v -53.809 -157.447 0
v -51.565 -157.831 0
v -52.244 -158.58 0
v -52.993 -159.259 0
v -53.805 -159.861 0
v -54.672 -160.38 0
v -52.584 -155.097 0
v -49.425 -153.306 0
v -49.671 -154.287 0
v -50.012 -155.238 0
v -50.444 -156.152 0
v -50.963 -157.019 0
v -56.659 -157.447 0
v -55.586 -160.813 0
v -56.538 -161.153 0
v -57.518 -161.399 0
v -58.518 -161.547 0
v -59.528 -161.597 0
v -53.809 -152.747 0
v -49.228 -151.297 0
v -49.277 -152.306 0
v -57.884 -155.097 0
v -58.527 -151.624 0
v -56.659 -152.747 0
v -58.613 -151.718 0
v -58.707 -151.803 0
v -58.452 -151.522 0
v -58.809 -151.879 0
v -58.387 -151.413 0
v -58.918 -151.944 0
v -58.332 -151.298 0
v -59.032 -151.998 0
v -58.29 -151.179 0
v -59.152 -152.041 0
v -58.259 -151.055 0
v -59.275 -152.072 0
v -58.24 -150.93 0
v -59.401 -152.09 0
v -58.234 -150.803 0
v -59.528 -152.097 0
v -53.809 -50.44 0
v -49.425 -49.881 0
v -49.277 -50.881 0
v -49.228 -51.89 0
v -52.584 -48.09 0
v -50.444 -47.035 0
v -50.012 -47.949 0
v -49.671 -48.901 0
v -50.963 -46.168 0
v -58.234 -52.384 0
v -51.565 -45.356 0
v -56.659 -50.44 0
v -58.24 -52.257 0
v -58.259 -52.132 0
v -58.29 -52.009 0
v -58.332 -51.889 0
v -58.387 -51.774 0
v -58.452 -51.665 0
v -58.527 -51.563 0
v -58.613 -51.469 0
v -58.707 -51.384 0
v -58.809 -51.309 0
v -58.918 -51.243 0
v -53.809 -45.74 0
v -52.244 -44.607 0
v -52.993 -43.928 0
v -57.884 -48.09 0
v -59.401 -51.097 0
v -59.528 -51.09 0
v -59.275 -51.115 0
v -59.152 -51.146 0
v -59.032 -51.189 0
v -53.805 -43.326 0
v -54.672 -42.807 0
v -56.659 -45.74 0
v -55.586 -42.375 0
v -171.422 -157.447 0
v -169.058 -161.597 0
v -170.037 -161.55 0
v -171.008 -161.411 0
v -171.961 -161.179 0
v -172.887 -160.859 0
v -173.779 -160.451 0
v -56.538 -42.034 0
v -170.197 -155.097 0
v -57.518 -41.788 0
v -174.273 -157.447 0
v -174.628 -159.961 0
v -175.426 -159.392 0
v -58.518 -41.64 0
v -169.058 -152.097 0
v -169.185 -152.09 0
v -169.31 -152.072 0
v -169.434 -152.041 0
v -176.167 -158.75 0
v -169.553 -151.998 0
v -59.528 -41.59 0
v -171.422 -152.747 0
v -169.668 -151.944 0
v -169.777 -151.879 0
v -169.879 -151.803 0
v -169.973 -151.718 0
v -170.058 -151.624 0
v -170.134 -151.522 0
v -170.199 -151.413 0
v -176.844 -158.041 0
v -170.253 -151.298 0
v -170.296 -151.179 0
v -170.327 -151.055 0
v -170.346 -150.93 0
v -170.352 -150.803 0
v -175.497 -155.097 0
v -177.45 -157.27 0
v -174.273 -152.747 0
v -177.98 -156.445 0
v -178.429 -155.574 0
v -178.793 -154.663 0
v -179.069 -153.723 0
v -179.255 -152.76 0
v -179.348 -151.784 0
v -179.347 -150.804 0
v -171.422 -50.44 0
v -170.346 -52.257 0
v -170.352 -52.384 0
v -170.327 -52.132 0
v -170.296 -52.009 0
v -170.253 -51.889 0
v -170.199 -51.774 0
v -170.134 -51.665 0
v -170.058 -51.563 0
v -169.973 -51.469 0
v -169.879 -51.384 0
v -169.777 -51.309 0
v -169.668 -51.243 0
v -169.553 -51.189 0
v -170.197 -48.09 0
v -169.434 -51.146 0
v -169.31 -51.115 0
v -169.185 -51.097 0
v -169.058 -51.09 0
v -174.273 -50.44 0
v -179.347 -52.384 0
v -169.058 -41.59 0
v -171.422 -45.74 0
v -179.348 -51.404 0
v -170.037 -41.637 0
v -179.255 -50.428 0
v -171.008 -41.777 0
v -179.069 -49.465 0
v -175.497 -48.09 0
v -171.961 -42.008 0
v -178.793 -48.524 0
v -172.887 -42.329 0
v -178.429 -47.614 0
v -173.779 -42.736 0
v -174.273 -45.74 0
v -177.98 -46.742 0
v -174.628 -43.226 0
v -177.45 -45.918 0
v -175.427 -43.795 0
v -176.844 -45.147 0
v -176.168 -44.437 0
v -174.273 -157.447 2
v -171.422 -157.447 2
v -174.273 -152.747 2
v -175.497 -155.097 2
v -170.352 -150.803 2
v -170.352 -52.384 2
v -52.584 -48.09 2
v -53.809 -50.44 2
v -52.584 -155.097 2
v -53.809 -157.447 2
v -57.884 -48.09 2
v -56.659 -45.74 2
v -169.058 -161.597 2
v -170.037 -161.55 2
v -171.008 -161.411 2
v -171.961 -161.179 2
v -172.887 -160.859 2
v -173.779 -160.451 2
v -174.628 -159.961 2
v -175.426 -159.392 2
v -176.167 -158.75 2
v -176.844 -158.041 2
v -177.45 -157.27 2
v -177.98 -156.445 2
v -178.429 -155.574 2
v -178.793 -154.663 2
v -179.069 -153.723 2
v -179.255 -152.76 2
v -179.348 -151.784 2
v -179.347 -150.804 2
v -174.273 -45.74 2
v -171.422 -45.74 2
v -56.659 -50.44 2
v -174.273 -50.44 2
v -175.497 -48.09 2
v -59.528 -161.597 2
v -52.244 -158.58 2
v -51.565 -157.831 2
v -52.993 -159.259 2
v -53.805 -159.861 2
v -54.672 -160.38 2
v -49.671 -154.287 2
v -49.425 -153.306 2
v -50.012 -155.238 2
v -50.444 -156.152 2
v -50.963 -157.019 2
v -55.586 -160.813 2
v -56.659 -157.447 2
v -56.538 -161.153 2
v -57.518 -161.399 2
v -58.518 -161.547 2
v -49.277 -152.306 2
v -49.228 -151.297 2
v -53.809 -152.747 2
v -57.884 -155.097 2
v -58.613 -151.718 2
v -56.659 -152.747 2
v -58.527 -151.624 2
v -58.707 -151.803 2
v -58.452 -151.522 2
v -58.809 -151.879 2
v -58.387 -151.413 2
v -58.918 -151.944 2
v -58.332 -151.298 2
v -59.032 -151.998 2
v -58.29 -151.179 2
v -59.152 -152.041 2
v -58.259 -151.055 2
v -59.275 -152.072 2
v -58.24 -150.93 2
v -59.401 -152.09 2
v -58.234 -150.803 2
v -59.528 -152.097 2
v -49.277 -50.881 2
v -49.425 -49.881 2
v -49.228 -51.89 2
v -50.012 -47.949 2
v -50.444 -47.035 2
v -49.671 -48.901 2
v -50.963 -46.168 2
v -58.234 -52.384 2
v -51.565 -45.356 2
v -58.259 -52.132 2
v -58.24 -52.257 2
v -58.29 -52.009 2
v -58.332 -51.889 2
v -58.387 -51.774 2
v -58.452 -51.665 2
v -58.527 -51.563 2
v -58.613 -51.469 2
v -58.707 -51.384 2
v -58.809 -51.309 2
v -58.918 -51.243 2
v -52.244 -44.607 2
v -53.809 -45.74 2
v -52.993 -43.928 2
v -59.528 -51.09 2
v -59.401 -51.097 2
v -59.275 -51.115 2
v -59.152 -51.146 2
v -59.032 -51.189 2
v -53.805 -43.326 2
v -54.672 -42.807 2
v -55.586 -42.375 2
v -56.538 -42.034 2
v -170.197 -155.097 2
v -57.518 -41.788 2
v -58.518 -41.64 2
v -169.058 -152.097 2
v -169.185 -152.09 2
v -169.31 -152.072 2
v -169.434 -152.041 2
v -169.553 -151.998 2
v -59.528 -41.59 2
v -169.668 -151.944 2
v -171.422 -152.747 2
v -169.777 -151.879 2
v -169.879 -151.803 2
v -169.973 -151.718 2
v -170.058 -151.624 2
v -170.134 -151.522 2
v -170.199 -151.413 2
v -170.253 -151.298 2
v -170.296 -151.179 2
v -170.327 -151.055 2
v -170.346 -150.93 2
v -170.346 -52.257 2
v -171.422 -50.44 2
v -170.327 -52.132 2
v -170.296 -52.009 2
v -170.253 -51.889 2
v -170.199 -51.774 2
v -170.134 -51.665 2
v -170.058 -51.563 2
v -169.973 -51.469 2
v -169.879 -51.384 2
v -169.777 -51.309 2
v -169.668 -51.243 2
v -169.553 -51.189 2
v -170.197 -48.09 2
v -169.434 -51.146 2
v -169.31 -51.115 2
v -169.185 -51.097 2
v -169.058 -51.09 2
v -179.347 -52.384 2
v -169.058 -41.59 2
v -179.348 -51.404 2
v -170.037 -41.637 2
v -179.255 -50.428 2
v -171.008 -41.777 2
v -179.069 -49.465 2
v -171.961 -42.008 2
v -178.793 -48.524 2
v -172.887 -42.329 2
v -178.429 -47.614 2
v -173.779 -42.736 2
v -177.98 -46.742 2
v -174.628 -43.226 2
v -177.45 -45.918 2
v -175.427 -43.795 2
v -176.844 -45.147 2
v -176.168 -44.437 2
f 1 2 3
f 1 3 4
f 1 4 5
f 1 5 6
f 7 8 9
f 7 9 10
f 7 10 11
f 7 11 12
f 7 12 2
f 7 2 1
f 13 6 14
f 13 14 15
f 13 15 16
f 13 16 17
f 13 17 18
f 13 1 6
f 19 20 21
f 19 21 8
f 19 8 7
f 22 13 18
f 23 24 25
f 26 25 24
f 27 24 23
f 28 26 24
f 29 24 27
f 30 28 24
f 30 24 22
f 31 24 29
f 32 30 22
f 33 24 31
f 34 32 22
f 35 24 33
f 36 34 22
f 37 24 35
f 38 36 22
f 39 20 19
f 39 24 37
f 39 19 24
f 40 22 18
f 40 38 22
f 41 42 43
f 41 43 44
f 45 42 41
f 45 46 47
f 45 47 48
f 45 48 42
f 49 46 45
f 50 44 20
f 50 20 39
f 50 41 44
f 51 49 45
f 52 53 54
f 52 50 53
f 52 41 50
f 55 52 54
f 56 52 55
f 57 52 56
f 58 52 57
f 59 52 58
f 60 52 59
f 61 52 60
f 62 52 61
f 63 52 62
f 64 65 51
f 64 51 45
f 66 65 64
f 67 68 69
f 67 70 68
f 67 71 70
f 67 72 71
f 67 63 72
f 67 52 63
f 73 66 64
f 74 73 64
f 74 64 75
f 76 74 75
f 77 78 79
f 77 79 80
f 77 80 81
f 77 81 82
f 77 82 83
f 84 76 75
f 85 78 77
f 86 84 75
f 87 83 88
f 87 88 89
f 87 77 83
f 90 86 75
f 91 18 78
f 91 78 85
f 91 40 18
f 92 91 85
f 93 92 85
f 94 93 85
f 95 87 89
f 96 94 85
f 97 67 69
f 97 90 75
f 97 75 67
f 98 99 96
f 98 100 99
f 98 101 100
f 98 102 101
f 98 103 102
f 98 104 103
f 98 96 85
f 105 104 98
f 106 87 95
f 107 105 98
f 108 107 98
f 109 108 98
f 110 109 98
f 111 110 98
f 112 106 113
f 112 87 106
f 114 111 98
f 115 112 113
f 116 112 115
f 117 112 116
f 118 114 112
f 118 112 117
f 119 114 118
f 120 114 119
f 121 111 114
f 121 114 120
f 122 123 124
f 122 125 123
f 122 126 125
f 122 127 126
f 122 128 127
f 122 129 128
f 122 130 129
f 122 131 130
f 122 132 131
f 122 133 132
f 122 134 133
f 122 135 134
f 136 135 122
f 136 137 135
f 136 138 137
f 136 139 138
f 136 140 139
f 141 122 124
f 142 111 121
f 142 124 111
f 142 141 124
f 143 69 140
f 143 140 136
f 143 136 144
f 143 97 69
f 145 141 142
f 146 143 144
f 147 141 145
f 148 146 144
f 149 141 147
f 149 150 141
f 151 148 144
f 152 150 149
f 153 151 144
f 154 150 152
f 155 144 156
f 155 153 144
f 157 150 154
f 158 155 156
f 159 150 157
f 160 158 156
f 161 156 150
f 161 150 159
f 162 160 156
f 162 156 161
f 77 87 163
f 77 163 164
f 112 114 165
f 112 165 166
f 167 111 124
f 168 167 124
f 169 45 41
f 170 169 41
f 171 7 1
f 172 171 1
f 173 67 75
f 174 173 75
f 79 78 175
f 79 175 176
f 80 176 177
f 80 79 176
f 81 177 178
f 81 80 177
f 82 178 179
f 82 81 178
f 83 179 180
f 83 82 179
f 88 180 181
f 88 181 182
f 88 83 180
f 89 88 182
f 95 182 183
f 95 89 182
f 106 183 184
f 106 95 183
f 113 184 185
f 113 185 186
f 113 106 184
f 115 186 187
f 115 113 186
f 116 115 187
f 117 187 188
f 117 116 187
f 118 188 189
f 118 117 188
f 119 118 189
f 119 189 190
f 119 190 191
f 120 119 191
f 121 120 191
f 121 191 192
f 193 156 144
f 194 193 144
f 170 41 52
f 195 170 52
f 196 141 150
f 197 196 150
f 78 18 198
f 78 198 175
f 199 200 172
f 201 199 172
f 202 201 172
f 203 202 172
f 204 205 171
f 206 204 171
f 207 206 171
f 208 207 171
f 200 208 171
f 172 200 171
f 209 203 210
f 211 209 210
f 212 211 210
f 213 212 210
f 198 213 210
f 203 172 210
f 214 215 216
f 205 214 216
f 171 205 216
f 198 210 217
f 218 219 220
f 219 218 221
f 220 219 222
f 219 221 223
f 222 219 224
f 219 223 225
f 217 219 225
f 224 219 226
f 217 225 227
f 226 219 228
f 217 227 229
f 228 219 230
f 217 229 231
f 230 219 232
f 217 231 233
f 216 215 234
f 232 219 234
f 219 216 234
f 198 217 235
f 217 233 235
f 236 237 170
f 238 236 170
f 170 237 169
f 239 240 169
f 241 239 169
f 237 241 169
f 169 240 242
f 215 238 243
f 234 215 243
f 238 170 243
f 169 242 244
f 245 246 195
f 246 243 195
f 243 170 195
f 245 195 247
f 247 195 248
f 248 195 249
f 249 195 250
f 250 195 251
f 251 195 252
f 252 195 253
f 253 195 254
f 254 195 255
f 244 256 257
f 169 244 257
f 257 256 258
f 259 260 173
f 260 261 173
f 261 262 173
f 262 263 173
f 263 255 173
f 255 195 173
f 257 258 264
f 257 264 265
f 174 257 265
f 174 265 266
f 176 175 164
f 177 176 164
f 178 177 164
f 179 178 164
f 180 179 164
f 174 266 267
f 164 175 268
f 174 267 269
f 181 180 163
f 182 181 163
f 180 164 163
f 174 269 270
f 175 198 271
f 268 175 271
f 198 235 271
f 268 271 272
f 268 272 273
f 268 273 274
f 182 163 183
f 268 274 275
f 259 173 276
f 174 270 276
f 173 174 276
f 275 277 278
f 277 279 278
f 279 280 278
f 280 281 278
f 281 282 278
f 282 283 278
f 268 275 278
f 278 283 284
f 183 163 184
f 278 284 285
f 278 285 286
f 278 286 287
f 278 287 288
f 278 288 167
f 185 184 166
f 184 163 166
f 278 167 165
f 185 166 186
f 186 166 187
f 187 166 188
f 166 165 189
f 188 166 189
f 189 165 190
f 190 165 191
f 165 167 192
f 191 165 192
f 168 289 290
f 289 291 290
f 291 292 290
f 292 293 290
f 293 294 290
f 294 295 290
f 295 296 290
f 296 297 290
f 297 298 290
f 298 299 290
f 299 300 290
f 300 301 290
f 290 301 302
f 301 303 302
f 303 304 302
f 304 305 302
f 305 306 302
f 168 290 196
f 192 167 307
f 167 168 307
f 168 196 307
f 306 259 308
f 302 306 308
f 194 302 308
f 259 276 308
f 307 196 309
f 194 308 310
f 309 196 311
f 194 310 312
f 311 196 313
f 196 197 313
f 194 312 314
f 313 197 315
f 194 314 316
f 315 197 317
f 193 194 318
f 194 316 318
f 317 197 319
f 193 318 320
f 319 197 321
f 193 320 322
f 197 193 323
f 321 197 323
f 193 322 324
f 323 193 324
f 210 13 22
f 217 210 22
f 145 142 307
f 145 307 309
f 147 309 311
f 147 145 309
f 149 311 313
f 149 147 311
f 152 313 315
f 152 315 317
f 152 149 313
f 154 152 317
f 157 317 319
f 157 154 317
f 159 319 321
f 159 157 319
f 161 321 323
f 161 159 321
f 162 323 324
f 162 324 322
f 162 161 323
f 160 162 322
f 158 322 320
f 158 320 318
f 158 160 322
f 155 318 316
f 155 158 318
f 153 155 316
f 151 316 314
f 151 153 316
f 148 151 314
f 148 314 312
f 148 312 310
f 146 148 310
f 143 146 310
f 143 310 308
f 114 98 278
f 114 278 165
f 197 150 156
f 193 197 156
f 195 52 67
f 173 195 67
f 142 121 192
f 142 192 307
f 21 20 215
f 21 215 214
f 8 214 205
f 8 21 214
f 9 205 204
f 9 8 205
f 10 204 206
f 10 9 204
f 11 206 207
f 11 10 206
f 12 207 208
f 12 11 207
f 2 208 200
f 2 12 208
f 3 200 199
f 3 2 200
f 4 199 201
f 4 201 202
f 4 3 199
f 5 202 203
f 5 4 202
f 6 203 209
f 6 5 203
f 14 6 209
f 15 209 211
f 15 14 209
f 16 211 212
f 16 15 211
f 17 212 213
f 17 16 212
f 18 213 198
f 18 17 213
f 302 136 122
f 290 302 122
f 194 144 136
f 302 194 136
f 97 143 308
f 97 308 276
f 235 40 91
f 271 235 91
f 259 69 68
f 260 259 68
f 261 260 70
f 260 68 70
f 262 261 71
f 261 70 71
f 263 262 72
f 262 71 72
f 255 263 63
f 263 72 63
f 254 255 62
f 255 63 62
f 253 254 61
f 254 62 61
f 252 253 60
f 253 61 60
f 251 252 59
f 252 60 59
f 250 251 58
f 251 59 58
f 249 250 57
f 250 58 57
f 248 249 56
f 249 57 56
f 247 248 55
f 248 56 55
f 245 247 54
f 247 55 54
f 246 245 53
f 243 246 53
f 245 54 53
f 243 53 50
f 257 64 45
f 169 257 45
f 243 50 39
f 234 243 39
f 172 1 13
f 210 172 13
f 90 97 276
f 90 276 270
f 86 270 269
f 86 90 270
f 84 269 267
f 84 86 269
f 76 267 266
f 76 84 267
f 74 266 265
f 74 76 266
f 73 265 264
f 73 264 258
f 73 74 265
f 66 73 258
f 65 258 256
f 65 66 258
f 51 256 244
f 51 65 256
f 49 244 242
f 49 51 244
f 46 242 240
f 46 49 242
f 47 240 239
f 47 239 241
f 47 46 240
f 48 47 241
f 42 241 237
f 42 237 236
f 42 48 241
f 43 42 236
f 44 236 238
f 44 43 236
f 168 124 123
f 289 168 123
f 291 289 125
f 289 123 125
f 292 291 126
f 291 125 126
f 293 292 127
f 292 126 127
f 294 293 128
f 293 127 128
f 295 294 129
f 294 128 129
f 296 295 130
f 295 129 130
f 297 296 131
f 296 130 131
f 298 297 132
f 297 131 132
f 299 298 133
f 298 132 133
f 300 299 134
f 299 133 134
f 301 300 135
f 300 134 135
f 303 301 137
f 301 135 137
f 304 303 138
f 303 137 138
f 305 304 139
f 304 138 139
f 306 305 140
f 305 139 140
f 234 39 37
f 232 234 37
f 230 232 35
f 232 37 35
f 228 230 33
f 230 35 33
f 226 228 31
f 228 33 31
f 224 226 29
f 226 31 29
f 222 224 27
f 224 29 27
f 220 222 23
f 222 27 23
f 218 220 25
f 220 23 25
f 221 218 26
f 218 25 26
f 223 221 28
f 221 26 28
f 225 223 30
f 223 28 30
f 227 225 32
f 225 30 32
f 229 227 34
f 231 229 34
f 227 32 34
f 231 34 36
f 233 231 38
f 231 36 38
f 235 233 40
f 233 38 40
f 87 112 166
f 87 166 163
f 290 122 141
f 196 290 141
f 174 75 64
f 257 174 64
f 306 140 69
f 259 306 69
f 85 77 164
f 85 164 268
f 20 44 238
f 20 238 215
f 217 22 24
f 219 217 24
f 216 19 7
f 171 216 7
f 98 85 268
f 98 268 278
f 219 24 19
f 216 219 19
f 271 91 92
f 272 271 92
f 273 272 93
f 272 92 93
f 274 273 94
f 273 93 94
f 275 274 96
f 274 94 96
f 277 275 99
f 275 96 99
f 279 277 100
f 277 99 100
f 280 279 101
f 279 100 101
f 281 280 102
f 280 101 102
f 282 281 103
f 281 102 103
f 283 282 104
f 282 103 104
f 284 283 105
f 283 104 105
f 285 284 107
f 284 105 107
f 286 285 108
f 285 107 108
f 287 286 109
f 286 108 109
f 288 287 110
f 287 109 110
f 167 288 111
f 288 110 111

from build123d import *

# Parameters (mm, degrees)
AUFSATZ_LINEAR_AUSTRAGEN1_DEPTH = 2


with BuildPart() as part:
    # Skizze1 → Aufsatz-Linear austragen1 (new body)
    with BuildSketch(Plane.XY):
        with BuildLine():
            Line((-49.2275, -51.8905), (-49.2275, -151.2967))
            ThreePointArc((-49.2275, -151.2967), (-52.244300154, -158.579899846), (-59.5275, -161.5967))
            Line((-59.5275, -161.5967), (-169.0581, -161.5967))
            ThreePointArc((-169.0581, -161.5967), (-176.514004305, -158.403485592), (-179.34742314, -150.803560266))
            Line((-179.34742314, -150.803560266), (-179.34742314, -52.3842))
            ThreePointArc((-179.34742314, -52.3842), (-176.514207067, -44.783915623), (-169.0581, -41.5905))
            Line((-169.0581, -41.5905), (-59.5275, -41.5905))
            ThreePointArc((-59.5275, -41.5905), (-52.244300154, -44.607300154), (-49.2275, -51.8905))
        make_face()
        with BuildLine():
            Line((-59.5275, -152.0967), (-169.0581, -152.0967))
            ThreePointArc((-169.0581, -152.0967), (-169.972884043, -151.717784043), (-170.3518, -150.803))
            Line((-170.3518, -150.803), (-170.3518, -52.3842))
            ThreePointArc((-170.3518, -52.3842), (-169.972884043, -51.469415957), (-169.0581, -51.0905))
            Line((-169.0581, -51.0905), (-59.5275, -51.0905))
            ThreePointArc((-59.5275, -51.0905), (-58.612715957, -51.469415957), (-58.2338, -52.3842))
            Line((-58.2338, -52.3842), (-58.2338, -150.803))
            ThreePointArc((-58.2338, -150.803), (-58.612715957, -151.717784043), (-59.5275, -152.0967))
        make_face(mode=Mode.SUBTRACT)
        Polygon((-57.8838, -155.0967), (-56.659055129, -152.7467), (-53.808544871, -152.7467), (-52.5838, -155.0967), (-53.808544871, -157.4467), (-56.659055129, -157.4467), align=None, mode=Mode.SUBTRACT)
        Polygon((-171.422168012, -157.4467), (-170.19742314, -155.0967), (-171.422168012, -152.7467), (-174.272678269, -152.7467), (-175.49742314, -155.0967), (-174.272678269, -157.4467), align=None, mode=Mode.SUBTRACT)
        Polygon((-175.49742314, -48.0905), (-174.272678269, -45.7405), (-171.422168012, -45.7405), (-170.19742314, -48.0905), (-171.422168012, -50.4405), (-174.272678269, -50.4405), align=None, mode=Mode.SUBTRACT)
        Polygon((-57.8838, -48.0905), (-56.659055129, -45.7405), (-53.808544871, -45.7405), (-52.5838, -48.0905), (-53.808544871, -50.4405), (-56.659055129, -50.4405), align=None, mode=Mode.SUBTRACT)
    extrude(amount=AUFSATZ_LINEAR_AUSTRAGEN1_DEPTH)


solid = part.part
